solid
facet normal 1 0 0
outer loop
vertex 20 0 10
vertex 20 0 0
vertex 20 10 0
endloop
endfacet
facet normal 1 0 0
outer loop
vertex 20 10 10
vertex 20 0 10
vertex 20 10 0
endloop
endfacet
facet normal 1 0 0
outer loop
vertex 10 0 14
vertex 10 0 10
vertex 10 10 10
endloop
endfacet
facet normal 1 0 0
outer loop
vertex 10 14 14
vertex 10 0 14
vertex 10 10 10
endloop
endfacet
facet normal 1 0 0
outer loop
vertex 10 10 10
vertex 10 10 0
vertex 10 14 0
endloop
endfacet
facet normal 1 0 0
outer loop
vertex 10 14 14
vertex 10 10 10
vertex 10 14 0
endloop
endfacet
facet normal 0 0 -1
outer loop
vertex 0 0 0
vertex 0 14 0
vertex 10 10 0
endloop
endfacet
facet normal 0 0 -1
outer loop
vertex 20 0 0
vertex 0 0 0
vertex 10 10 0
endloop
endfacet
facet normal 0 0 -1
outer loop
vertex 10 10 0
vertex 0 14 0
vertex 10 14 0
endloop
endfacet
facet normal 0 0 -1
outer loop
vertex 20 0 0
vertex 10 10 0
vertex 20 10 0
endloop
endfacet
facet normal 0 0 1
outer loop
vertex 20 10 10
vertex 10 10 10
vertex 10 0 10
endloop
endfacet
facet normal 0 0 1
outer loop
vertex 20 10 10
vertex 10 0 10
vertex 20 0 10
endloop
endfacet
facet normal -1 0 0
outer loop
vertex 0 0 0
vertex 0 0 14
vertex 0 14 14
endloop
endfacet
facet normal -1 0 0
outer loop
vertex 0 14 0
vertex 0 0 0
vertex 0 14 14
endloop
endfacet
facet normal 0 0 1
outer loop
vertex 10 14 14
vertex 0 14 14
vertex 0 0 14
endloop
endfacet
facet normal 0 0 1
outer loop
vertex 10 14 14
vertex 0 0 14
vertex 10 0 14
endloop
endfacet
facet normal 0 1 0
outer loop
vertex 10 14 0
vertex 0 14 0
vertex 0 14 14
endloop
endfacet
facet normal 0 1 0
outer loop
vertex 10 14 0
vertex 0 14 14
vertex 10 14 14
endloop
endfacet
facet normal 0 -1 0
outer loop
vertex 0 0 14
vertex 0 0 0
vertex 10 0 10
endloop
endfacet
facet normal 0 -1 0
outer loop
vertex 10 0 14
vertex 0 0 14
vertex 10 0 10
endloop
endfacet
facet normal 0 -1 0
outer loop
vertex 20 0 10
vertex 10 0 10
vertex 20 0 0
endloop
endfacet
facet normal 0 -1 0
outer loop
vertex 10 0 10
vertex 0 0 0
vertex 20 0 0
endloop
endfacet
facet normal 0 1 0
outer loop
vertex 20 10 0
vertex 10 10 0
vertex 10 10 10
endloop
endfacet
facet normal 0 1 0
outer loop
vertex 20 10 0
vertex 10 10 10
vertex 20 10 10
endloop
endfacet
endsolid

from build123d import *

# Parameters (mm, degrees)
BOX001_W     = 10
BOX001_H     = 10
BOX001_DEPTH = 10
BOX_W        = 10
BOX_H        = 14
BOX_DEPTH    = 14


with BuildPart() as box001:
    # Box001 → Box001 (new body)
    with BuildSketch(Plane(origin=(10, 0, 0), x_dir=(1, 0, 0), z_dir=(0, 0, 1))):
        with Locations((5, 5)):
            Rectangle(BOX001_W, BOX001_H)
    extrude(amount=BOX001_DEPTH)


with BuildPart() as la_meva_pe_a001:
    # Box → Box (new body)
    with BuildSketch(Plane.XY):
        with Locations((5, 7)):
            Rectangle(BOX_W, BOX_H)
    extrude(amount=BOX_DEPTH)

    # Fusion: union Box001
    add(box001.part)


solid = la_meva_pe_a001.part
